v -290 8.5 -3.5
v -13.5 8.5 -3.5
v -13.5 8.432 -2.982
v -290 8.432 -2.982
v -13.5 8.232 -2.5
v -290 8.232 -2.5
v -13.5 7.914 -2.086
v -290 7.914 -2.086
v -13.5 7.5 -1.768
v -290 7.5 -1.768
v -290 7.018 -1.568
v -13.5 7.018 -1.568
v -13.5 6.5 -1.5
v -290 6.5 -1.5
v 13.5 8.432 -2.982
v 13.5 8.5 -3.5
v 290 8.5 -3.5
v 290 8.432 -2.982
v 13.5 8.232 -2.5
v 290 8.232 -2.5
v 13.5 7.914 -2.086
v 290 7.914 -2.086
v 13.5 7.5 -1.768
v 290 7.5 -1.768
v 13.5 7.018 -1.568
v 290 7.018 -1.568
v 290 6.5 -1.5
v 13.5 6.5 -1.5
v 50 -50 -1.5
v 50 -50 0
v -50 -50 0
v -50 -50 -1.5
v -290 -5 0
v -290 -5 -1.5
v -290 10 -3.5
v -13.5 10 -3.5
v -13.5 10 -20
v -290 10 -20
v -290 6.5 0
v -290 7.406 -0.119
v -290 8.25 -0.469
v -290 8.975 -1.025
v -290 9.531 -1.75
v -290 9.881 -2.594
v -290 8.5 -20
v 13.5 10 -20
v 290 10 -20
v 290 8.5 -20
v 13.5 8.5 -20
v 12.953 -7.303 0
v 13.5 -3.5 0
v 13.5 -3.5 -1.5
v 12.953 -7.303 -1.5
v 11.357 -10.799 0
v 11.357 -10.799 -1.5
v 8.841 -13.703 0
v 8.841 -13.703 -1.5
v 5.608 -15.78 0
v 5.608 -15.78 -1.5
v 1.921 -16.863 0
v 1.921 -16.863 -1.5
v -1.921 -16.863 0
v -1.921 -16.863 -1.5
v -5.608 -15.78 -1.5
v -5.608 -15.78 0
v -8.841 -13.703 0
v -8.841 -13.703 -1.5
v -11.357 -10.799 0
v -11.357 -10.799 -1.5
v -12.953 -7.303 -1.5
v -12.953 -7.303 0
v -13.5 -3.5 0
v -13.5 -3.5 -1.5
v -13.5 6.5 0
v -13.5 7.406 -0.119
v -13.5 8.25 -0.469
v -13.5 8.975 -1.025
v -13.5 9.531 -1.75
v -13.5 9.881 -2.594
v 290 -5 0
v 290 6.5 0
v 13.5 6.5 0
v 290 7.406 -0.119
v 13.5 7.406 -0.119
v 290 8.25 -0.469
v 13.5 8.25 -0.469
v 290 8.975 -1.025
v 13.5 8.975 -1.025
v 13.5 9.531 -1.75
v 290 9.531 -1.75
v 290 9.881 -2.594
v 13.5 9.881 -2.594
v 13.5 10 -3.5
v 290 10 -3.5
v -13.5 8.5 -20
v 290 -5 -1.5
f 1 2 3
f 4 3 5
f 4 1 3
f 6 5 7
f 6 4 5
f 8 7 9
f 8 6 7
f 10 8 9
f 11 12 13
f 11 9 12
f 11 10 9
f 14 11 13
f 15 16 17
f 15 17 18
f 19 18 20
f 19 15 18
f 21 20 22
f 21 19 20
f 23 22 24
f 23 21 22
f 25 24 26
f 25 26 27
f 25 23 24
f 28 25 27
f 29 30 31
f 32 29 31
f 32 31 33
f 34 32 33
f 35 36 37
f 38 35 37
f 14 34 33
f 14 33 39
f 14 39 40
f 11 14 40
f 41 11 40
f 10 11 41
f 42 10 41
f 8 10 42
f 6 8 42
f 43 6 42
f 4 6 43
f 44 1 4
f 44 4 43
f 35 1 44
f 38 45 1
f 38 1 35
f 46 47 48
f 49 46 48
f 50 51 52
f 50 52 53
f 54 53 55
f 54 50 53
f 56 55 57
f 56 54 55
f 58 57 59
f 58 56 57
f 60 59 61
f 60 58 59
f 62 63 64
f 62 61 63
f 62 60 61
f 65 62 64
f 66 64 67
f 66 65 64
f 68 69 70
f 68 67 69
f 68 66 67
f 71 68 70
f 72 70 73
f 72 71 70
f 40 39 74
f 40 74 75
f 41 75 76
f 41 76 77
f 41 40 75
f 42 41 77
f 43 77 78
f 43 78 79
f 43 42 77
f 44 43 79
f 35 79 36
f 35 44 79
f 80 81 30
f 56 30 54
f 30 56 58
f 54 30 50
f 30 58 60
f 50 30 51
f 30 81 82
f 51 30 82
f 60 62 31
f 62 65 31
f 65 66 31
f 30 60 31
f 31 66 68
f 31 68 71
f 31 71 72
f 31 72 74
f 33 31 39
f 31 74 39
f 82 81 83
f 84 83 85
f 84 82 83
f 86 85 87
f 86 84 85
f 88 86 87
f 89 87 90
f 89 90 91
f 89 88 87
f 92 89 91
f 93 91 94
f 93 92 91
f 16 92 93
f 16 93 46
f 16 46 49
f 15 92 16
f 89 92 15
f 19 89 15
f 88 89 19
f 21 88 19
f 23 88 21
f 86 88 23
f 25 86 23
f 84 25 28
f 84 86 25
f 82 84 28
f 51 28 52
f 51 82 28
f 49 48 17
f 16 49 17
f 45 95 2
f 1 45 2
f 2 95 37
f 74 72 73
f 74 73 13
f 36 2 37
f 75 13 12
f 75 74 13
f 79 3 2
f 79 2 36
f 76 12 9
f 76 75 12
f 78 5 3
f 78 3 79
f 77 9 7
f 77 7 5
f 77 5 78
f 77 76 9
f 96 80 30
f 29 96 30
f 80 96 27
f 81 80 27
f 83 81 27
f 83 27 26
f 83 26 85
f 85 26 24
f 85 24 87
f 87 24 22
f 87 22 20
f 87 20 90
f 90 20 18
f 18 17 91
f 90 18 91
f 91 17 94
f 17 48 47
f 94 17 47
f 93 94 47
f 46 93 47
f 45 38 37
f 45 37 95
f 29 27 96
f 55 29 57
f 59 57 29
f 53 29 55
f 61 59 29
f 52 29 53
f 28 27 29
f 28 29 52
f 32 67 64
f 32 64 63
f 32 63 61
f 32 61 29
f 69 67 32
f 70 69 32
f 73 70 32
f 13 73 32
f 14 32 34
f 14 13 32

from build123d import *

# Parameters (mm, degrees)
BASE_FLANGE2_DEPTH           = 1.5
EDGE_FLANGE1_STRIP_W         = 10
EDGE_FLANGE1_STRIP_H         = 1.5
EDGE_FLANGE1_STRIP_CUT_DEPTH = 580
EDGE_FLANGE1_DEPTH           = 580
CUT_EXTRUDE1_DEPTH           = 295.957624075


# Sheet-metal steps are written as plain solids
with BuildPart() as part:
    # Sketch1 → Base-Flange2 (new body)
    with BuildSketch(Plane.XY):
        Polygon((-290, 10), (290, 10), (290, -5), (50, -50), (-50, -50), (-290, -5), align=None)
    extrude(amount=-BASE_FLANGE2_DEPTH)

    # Edge-Flange1 strip (across the edge) → Edge-Flange1 strip cut (cut)
    with BuildSketch(Plane(origin=(-290, 10, -1.5), x_dir=(0, -1, 0), z_dir=(1, 0, 0))):
        with Locations((-1.5, -0.75)):
            Rectangle(EDGE_FLANGE1_STRIP_W, EDGE_FLANGE1_STRIP_H)
    extrude(amount=EDGE_FLANGE1_STRIP_CUT_DEPTH, mode=Mode.SUBTRACT)

    # Edge-Flange1 section (across the edge) → Edge-Flange1 (add)
    with BuildSketch(Plane(origin=(-290, 10, -1.5), x_dir=(0, -1, 0), z_dir=(1, 0, 0))):
        with BuildLine():
            Line((0, 2), (0, 18.5))
            Line((0, 18.5), (1.5, 18.5))
            Line((1.5, 18.5), (1.5, 2))
            ThreePointArc((1.5, 2), (2.085786438, 0.585786438), (3.5, 0))
            Line((3.5, 0), (3.5, -1.5))
            ThreePointArc((3.5, -1.5), (1.025126266, -0.474873734), (0, 2))
        make_face()
    extrude(amount=EDGE_FLANGE1_DEPTH)

    # Sketch13 → Cut-Extrude1 (cut, through all)
    with BuildSketch(Plane.XY):
        with BuildLine():
            Line((-13.5, -3.5), (-13.5, 21.0126417))
            Line((-13.5, 21.0126417), (13.5, 21.0126417))
            Line((13.5, 21.0126417), (13.5, -3.5))
            ThreePointArc((13.5, -3.5), (0, -17), (-13.5, -3.5))
        make_face()
    extrude(amount=-CUT_EXTRUDE1_DEPTH, mode=Mode.SUBTRACT)


solid = part.part
